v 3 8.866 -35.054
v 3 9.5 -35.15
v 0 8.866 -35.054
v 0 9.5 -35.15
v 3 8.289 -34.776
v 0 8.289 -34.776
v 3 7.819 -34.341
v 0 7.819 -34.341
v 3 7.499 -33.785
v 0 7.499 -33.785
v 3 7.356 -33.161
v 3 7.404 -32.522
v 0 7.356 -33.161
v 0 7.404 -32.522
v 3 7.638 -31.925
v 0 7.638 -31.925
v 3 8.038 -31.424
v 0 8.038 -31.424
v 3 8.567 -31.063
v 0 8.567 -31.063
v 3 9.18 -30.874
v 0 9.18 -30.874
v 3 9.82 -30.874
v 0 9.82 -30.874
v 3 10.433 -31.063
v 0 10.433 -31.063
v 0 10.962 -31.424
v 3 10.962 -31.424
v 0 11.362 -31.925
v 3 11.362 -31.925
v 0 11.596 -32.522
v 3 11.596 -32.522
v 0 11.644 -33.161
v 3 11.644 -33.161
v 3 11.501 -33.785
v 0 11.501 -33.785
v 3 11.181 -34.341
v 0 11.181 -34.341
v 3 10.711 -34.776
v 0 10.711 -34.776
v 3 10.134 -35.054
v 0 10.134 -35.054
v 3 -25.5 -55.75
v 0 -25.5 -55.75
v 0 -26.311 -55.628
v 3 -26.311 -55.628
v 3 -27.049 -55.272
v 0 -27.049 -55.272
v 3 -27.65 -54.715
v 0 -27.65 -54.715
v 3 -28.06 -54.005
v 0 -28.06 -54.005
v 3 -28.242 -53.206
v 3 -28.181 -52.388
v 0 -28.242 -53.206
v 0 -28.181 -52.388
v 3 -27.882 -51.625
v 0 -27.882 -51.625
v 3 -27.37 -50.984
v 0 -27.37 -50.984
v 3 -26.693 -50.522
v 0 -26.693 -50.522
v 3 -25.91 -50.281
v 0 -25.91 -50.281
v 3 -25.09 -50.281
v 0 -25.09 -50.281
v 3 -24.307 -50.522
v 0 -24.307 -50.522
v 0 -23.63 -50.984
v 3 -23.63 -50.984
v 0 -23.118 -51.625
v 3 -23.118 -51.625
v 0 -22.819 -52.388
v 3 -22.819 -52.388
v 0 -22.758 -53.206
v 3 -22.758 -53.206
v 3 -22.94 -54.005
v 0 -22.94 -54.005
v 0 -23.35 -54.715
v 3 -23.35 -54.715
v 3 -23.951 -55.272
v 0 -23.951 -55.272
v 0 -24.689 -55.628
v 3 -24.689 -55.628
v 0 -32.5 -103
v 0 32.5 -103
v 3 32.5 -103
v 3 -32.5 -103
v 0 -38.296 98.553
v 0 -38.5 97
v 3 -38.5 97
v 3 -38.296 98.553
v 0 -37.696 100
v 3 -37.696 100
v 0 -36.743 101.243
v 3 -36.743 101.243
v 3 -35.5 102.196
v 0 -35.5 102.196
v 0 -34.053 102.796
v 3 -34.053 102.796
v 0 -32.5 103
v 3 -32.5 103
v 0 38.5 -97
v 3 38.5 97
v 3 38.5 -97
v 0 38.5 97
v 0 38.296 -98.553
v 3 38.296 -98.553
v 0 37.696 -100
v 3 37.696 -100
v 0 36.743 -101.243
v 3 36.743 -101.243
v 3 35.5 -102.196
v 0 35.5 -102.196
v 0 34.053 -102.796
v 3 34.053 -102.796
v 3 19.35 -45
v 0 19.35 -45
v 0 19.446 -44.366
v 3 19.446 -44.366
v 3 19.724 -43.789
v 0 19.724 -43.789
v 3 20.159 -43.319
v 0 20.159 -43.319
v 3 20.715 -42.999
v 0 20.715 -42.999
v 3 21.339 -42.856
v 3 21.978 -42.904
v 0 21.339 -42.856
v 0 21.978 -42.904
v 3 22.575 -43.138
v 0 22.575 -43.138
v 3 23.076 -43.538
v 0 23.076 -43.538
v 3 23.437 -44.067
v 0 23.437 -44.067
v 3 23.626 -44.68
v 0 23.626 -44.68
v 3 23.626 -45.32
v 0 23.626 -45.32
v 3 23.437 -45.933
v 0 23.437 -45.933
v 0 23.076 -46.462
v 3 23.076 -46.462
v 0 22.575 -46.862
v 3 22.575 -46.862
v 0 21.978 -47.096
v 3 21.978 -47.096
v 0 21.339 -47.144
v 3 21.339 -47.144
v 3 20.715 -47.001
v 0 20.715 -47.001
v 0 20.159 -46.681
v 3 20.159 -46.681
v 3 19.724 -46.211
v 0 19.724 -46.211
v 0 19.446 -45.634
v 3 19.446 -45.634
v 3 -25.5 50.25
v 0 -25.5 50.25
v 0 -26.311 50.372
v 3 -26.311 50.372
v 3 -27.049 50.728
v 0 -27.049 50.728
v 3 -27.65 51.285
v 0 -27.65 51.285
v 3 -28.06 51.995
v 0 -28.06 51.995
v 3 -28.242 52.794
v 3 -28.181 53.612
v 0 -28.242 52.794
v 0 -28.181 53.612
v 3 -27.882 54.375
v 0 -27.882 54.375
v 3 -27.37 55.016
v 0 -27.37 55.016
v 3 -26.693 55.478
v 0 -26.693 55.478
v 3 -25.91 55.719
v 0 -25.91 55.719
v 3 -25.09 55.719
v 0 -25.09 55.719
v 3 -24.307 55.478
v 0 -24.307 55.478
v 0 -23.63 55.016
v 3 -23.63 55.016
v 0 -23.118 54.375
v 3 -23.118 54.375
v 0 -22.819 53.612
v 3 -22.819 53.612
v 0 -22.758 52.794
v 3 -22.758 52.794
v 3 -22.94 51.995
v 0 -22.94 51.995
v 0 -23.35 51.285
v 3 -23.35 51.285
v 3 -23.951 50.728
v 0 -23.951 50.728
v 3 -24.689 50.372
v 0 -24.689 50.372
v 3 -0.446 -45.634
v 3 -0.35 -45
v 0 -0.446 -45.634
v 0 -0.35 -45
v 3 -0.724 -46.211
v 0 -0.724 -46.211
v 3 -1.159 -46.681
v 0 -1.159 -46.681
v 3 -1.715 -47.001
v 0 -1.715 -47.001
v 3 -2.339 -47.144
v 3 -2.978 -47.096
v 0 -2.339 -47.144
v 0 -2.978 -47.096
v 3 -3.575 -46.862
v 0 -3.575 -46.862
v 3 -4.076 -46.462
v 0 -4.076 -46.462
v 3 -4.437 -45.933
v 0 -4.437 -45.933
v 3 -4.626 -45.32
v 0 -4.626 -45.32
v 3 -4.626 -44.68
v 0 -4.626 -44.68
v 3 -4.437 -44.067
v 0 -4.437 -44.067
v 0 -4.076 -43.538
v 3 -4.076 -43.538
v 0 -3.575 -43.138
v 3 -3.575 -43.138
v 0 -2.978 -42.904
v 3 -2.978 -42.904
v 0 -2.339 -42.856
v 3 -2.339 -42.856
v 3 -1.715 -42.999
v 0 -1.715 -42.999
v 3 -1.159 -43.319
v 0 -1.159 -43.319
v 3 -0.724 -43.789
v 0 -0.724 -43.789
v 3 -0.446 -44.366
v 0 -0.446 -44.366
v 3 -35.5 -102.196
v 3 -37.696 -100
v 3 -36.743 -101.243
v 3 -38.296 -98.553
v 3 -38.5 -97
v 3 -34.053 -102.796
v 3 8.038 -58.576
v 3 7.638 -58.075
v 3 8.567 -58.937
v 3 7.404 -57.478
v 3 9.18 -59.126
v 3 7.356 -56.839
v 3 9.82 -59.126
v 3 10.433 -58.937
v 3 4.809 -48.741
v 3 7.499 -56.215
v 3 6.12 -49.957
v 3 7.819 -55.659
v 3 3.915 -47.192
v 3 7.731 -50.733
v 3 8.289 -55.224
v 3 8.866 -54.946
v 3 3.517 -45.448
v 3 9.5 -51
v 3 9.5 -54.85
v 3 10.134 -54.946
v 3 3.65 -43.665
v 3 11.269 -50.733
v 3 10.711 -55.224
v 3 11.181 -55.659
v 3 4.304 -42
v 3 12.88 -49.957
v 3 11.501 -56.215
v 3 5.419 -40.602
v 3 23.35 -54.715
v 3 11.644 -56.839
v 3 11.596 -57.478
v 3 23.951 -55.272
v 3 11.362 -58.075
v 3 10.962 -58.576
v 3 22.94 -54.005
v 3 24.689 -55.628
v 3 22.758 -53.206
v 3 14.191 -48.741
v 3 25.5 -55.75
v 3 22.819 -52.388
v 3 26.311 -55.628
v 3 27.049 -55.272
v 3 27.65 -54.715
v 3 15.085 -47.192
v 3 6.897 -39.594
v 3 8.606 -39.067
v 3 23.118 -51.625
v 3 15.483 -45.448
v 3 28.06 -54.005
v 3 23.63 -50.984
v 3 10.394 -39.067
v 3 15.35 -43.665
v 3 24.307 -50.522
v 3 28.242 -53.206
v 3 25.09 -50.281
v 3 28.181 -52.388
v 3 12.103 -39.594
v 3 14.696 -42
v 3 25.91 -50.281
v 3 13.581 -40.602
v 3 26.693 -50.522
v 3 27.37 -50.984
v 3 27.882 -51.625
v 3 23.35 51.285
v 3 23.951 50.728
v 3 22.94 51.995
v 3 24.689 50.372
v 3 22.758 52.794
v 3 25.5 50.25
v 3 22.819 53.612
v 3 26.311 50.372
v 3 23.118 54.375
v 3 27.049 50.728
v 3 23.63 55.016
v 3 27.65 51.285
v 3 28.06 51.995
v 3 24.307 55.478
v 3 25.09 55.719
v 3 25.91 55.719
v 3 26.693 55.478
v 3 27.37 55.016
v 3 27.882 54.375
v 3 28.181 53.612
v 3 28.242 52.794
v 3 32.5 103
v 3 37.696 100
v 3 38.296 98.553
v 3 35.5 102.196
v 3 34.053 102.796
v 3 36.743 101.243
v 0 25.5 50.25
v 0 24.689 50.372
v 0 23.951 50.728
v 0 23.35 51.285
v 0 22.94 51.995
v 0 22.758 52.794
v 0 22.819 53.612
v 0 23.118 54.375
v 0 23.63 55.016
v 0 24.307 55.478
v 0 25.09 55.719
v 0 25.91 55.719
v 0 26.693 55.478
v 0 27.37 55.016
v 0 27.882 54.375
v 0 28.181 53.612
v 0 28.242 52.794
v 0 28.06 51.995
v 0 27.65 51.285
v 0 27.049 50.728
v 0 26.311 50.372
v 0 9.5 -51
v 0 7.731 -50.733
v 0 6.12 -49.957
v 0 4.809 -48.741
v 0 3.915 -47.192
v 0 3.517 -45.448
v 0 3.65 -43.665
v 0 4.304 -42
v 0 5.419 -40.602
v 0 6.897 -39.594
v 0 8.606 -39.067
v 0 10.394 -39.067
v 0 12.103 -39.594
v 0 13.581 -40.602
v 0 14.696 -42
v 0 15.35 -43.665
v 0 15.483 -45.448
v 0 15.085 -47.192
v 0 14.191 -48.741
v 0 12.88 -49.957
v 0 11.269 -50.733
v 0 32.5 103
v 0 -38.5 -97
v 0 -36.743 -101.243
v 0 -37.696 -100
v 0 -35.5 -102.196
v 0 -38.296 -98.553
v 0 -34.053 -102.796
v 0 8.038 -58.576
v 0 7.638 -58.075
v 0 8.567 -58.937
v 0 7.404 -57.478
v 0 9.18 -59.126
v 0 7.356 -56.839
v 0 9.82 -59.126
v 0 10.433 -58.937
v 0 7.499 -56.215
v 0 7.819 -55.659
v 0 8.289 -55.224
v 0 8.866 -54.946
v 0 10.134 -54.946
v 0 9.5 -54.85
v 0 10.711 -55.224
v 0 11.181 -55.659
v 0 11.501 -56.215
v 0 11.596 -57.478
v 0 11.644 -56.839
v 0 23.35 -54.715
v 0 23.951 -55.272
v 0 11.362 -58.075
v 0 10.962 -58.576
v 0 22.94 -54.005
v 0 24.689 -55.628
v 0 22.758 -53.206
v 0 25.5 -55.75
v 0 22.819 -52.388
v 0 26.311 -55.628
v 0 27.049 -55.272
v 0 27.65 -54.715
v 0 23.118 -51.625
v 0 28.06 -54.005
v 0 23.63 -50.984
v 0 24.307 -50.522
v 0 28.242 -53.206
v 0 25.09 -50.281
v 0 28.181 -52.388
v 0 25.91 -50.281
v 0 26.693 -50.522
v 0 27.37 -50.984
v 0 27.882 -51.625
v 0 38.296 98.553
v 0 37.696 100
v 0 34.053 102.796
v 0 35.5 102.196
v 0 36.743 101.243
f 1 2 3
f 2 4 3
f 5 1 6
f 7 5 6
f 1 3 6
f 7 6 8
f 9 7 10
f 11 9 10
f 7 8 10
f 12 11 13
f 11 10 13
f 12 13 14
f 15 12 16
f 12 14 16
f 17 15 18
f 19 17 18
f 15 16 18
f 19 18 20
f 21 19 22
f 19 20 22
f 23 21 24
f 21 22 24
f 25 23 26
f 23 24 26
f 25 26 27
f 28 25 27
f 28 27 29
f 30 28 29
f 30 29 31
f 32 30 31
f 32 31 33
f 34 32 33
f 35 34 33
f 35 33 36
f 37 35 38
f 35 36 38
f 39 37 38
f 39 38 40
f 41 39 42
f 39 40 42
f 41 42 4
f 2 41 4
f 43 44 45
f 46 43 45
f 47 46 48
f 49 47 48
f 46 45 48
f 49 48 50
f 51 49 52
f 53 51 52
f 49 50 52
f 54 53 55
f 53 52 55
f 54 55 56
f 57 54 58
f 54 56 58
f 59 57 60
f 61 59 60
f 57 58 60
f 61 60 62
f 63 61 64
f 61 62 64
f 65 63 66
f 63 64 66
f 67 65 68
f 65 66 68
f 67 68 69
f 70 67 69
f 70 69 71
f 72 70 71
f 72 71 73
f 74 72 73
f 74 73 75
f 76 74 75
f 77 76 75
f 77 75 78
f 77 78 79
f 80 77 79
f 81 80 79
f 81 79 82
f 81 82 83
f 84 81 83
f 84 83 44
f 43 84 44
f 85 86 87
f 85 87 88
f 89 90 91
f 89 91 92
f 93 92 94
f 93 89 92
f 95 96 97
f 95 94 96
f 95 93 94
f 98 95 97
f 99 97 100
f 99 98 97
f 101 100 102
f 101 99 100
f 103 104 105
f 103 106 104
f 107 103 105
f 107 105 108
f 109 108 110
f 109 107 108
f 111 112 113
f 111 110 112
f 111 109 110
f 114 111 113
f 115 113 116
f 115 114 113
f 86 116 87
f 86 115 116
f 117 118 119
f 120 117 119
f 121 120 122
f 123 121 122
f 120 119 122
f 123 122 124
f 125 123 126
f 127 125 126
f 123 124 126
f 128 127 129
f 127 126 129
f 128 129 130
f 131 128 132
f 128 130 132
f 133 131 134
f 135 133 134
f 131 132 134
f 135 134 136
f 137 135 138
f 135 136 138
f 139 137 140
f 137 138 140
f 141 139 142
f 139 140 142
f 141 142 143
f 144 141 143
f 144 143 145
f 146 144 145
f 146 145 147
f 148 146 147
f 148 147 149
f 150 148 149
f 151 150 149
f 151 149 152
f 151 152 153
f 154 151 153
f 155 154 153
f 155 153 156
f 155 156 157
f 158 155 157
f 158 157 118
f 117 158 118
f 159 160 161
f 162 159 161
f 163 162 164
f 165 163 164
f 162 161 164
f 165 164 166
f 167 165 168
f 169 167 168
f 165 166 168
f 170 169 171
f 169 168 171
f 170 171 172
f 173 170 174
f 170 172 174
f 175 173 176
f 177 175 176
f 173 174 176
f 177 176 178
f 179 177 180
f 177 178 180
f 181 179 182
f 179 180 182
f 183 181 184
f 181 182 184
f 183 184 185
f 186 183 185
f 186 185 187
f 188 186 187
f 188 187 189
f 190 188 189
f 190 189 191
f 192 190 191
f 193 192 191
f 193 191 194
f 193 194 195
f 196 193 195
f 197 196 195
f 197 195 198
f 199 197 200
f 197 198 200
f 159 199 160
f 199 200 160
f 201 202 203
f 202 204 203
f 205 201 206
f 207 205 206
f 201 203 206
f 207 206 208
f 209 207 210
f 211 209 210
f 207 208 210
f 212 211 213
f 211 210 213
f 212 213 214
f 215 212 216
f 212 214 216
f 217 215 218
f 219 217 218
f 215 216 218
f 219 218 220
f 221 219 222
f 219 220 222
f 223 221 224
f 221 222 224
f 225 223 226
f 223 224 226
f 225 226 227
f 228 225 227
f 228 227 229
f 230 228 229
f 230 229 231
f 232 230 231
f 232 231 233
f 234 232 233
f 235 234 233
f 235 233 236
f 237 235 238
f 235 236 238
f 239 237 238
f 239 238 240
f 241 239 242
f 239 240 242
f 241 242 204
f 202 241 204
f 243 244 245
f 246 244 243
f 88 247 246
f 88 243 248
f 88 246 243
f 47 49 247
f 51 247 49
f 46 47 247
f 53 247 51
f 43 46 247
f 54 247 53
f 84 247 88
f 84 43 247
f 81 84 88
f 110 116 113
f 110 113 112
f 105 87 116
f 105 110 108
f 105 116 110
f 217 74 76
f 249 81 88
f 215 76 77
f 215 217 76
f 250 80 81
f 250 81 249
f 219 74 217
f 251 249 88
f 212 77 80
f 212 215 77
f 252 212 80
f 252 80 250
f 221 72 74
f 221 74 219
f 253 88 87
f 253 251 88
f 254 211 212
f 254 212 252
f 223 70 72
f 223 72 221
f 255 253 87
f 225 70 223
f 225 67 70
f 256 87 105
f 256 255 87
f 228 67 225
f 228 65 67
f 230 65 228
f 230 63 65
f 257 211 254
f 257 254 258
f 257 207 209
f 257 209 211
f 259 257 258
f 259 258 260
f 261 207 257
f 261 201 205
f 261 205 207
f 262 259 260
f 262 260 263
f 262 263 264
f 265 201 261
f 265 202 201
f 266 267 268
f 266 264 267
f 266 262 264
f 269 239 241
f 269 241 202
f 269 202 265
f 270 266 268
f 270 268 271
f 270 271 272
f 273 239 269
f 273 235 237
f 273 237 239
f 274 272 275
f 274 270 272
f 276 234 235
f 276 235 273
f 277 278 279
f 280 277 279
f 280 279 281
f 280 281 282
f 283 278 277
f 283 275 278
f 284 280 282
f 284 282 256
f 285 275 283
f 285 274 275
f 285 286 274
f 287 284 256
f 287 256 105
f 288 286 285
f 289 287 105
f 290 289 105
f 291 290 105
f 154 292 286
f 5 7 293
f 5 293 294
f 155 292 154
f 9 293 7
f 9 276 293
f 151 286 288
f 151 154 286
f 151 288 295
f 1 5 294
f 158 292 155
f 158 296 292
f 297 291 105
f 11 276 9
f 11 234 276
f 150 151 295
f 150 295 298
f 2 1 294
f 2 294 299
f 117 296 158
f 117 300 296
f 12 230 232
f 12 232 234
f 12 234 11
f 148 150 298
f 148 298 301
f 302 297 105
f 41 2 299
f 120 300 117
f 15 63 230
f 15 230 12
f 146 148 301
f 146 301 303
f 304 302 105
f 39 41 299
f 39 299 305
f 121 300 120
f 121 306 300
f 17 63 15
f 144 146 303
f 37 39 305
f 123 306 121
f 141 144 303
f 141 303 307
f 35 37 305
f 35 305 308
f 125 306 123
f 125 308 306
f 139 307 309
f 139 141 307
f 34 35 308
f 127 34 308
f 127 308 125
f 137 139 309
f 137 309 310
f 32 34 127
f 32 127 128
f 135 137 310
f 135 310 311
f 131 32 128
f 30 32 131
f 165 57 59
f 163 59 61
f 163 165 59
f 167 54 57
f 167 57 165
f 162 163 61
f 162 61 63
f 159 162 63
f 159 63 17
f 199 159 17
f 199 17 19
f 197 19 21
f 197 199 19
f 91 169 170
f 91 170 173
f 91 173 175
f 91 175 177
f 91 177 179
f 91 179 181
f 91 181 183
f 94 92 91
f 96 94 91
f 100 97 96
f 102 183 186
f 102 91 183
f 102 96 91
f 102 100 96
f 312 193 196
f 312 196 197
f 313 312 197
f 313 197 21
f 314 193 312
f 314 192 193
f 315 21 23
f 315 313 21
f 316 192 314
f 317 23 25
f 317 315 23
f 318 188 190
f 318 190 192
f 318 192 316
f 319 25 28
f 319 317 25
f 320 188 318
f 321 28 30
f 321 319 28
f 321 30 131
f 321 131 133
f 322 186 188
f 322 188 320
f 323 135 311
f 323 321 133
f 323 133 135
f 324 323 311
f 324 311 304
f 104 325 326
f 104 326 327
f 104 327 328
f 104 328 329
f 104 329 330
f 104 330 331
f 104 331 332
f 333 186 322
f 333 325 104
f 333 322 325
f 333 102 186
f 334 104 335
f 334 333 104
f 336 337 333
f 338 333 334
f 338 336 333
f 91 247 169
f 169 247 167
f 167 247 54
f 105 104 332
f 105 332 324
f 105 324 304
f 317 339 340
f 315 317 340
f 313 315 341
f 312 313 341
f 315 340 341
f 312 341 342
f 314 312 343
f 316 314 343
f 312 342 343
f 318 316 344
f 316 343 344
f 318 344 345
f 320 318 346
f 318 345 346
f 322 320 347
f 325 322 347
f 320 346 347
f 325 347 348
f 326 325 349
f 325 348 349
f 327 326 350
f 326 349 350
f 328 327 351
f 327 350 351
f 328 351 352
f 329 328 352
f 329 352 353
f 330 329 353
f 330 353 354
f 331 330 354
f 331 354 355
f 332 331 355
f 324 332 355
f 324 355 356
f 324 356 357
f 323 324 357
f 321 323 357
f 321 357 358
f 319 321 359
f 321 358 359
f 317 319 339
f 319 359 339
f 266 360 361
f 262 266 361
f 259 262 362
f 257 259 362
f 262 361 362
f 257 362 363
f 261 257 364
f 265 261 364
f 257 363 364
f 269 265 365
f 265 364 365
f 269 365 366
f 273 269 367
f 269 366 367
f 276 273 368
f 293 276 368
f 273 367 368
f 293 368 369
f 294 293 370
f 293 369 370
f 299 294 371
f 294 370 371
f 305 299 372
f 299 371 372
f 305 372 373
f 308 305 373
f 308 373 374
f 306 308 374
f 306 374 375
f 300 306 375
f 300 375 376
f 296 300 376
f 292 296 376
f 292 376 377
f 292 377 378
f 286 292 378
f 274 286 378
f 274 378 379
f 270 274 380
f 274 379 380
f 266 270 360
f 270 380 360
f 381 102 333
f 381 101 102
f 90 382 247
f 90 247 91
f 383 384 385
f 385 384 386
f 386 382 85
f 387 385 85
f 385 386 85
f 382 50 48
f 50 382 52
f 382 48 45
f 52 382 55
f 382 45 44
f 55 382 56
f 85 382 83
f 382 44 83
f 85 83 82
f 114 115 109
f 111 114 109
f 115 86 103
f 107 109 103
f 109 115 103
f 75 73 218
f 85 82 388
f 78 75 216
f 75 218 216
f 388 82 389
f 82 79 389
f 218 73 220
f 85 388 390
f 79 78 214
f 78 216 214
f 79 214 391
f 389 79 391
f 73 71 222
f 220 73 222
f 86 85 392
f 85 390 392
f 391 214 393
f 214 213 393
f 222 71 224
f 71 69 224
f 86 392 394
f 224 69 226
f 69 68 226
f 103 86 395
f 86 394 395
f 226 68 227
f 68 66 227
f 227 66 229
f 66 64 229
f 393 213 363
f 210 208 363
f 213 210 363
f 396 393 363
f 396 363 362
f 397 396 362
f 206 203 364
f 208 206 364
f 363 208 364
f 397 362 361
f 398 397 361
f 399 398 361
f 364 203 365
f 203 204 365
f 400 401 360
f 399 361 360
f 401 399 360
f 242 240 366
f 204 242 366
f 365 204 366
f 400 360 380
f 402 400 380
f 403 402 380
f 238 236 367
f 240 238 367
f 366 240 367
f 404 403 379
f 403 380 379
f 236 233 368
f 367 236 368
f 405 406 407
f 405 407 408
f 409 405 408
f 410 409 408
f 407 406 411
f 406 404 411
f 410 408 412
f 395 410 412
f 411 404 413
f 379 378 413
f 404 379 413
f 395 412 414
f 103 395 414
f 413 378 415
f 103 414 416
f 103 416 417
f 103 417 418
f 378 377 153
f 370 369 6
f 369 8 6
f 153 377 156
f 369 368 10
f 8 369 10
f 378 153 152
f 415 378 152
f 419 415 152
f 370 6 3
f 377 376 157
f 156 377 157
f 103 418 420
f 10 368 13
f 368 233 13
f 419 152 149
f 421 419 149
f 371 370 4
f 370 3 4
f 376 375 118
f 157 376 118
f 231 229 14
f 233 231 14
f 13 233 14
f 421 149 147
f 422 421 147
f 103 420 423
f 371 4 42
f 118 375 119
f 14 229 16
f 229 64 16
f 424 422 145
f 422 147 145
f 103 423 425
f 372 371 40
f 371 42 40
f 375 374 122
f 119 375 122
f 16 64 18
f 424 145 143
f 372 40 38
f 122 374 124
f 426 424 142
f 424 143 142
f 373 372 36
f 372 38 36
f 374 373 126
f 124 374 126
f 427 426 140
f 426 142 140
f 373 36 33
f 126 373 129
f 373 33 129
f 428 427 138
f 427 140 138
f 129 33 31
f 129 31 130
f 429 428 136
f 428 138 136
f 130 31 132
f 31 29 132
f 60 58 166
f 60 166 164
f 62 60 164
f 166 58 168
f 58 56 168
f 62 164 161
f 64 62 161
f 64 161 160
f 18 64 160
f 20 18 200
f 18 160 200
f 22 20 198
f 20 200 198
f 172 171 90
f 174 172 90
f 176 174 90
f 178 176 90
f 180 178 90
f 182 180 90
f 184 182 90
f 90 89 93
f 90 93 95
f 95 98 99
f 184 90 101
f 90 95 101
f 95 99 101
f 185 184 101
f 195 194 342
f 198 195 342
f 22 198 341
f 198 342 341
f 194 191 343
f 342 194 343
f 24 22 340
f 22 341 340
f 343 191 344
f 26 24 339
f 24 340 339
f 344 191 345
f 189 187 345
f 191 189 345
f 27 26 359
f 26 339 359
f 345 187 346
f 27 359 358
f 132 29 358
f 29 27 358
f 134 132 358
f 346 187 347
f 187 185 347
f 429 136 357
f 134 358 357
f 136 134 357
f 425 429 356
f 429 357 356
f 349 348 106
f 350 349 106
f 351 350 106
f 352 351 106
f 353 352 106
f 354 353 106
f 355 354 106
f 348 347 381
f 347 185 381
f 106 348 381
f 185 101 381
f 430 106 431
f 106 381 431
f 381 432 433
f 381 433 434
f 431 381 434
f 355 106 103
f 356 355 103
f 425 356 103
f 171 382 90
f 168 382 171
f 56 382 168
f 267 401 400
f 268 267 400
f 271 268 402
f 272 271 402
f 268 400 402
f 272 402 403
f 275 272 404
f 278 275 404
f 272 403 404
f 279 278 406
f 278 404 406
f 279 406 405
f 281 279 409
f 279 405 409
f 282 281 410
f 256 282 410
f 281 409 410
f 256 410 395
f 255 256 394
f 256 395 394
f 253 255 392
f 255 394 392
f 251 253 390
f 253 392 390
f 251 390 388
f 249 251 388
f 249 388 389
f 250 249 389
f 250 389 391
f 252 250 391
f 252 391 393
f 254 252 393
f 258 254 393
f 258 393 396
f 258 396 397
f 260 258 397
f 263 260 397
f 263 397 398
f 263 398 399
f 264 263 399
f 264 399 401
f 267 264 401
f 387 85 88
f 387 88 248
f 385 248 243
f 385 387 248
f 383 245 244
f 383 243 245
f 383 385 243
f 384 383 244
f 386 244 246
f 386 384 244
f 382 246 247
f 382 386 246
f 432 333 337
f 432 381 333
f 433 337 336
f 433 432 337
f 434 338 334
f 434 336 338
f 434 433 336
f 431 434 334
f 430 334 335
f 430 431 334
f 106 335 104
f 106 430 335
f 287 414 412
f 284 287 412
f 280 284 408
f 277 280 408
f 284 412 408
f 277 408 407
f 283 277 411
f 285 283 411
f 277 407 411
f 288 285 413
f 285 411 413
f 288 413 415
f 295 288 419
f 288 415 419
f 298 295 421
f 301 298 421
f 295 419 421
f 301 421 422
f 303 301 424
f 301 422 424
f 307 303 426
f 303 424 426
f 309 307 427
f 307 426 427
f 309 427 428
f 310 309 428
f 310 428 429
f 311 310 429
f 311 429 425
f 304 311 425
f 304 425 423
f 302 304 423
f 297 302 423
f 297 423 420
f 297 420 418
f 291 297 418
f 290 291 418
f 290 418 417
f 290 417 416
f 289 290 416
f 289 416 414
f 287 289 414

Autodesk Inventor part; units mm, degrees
ref_plane "YZ Plane" through (0, 0, 0) normal (1, 0, 0) x (0, 1, 0)
ref_plane "XZ Plane" through (0, 0, 0) normal (0, 1, 0) x (-1, 0, 0)
ref_plane "XY Plane" through (0, 0, 0) normal (0, 0, 1) x (1, 0, 0)
sketch "Szkic1" plane through (0, 0, 0) normal (1, 0, 0) x (0, 1, 0)
  line L0 (-32.5, 103) -> (32.5, 103)
  line L1 (38.5, 97) -> (38.5, -97)
  line L2 (32.5, -103) -> (-32.5, -103)
  line L3 (-38.5, -97) -> (-38.5, 97)
  line L4 (-38.5, 103) -> (38.5, -103) construction
  arc A0 (32.5, -103) -> (38.5, -97) centre (32.5, -97) ccw
  arc A1 (-32.5, 103) -> (-38.5, 97) centre (-32.5, 97) ccw
  arc A2 (-38.5, -97) -> (-32.5, -103) centre (-32.5, -97) ccw
  arc A3 (38.5, 97) -> (32.5, 103) centre (32.5, 97) ccw
  point P0 (0, 0)
  dimension "d3" = 6
extrude "Płyta1" add sketch "Szkic1" along normal blind 3
sketch "Szkic2" plane through (3, 0, 0) normal (1, 0, 0) x (0, 0, -1)
  line L0 (-97, 38.5) -> (97, 38.5) projected
  line L1 (-103, -32.5) -> (-103, 32.5) projected
  line L2 (103, 32.5) -> (103, -32.5) projected
  line L3 (97, -38.5) -> (-97, -38.5) projected
  point P0 (0, 0)
  point P1 (-53, 25.5)
  point P2 (53, 25.5)
  point P3 (53, -25.5)
  point P4 (-53, -25.5)
  dimension "d5" = 13
  dimension "d6" = 50
  dimension "d7" = 50
  dimension "d8" = 13
  dimension "d9" = 50
  dimension "d10" = 13
  dimension "d11" = 13
  dimension "d12" = 50
hole "Otwór1" at (3, -25.5, 53) at (3, 25.5, 53) at (3, 25.5, -53) at (3, -25.5, -53) direction (-1, 0, 0) diameter 5.5 depth 3 tip angle 118 clearance for "Śruba ze łbem płaskim obrobiona" size "M5" standard "ANSI Profil metryczny M"
sketch "Sketch3" plane through (3, 0, 0) normal (1, 0, 0) x (0, 0, -1)
  line L0 (103, 32.5) -> (103, -32.5) projected
  line L1 (97, -38.5) -> (-97, -38.5) projected
  point P0 (0, 0)
  point P1 (45, 9.5)
  dimension "d20" = 58
  dimension "d40" = 48
hole "Hole2" at (3, 9.5, -45) direction (-1, 0, 0) diameter 12 depth 3 tip angle 118
sketch "Sketch4" plane through (3, 0, 0) normal (1, 0, 0) x (0, 0, -1)
  circle A0 centre (45, 9.5) radius 6 projected
  point P0 (0, 0)
  point P1 (33, 9.5)
  dimension "d28" = 12
  dimension "d29" = 0
hole "Hole3" at (3, 9.5, -33) direction (-1, 0, 0) diameter 4.3 depth 3 tip angle 118
pattern_circular "Circular Pattern1" count 4 over 360 about axis through (1.5, 9.5, -45) along (1, 0, 0) of "Hole3"
equation "\"d18\" = Grubość"
equation "\"d26\" = Grubość"
equation "\"d35\" = Grubość"
equation "\"d4\" = Grubość"
equation "\"PromieńGięcia\" = Grubość"
equation "\"SzerokośćGięciaPodcięcia\" = Grubość"
equation "\"GłębokośćGięciaPodcięcia\" = 0.5 * Grubość"
equation "\"RozmiarPodcięciaNarożnika\" = 4 * Grubość"
equation "\"MinimalnaPozostałość\" = 2 * Grubość"
equation "\"PromieńPrzejścia\" = PromieńGięcia"
equation "\"Rozmiar_promienia_Jacobiego\" = PromieńGięcia"
equation "\"Wielk_odstępu\" = Grubość"
equation "\"Grubość\" = 3"
properties part number "ZaslepkaObudowa2"
